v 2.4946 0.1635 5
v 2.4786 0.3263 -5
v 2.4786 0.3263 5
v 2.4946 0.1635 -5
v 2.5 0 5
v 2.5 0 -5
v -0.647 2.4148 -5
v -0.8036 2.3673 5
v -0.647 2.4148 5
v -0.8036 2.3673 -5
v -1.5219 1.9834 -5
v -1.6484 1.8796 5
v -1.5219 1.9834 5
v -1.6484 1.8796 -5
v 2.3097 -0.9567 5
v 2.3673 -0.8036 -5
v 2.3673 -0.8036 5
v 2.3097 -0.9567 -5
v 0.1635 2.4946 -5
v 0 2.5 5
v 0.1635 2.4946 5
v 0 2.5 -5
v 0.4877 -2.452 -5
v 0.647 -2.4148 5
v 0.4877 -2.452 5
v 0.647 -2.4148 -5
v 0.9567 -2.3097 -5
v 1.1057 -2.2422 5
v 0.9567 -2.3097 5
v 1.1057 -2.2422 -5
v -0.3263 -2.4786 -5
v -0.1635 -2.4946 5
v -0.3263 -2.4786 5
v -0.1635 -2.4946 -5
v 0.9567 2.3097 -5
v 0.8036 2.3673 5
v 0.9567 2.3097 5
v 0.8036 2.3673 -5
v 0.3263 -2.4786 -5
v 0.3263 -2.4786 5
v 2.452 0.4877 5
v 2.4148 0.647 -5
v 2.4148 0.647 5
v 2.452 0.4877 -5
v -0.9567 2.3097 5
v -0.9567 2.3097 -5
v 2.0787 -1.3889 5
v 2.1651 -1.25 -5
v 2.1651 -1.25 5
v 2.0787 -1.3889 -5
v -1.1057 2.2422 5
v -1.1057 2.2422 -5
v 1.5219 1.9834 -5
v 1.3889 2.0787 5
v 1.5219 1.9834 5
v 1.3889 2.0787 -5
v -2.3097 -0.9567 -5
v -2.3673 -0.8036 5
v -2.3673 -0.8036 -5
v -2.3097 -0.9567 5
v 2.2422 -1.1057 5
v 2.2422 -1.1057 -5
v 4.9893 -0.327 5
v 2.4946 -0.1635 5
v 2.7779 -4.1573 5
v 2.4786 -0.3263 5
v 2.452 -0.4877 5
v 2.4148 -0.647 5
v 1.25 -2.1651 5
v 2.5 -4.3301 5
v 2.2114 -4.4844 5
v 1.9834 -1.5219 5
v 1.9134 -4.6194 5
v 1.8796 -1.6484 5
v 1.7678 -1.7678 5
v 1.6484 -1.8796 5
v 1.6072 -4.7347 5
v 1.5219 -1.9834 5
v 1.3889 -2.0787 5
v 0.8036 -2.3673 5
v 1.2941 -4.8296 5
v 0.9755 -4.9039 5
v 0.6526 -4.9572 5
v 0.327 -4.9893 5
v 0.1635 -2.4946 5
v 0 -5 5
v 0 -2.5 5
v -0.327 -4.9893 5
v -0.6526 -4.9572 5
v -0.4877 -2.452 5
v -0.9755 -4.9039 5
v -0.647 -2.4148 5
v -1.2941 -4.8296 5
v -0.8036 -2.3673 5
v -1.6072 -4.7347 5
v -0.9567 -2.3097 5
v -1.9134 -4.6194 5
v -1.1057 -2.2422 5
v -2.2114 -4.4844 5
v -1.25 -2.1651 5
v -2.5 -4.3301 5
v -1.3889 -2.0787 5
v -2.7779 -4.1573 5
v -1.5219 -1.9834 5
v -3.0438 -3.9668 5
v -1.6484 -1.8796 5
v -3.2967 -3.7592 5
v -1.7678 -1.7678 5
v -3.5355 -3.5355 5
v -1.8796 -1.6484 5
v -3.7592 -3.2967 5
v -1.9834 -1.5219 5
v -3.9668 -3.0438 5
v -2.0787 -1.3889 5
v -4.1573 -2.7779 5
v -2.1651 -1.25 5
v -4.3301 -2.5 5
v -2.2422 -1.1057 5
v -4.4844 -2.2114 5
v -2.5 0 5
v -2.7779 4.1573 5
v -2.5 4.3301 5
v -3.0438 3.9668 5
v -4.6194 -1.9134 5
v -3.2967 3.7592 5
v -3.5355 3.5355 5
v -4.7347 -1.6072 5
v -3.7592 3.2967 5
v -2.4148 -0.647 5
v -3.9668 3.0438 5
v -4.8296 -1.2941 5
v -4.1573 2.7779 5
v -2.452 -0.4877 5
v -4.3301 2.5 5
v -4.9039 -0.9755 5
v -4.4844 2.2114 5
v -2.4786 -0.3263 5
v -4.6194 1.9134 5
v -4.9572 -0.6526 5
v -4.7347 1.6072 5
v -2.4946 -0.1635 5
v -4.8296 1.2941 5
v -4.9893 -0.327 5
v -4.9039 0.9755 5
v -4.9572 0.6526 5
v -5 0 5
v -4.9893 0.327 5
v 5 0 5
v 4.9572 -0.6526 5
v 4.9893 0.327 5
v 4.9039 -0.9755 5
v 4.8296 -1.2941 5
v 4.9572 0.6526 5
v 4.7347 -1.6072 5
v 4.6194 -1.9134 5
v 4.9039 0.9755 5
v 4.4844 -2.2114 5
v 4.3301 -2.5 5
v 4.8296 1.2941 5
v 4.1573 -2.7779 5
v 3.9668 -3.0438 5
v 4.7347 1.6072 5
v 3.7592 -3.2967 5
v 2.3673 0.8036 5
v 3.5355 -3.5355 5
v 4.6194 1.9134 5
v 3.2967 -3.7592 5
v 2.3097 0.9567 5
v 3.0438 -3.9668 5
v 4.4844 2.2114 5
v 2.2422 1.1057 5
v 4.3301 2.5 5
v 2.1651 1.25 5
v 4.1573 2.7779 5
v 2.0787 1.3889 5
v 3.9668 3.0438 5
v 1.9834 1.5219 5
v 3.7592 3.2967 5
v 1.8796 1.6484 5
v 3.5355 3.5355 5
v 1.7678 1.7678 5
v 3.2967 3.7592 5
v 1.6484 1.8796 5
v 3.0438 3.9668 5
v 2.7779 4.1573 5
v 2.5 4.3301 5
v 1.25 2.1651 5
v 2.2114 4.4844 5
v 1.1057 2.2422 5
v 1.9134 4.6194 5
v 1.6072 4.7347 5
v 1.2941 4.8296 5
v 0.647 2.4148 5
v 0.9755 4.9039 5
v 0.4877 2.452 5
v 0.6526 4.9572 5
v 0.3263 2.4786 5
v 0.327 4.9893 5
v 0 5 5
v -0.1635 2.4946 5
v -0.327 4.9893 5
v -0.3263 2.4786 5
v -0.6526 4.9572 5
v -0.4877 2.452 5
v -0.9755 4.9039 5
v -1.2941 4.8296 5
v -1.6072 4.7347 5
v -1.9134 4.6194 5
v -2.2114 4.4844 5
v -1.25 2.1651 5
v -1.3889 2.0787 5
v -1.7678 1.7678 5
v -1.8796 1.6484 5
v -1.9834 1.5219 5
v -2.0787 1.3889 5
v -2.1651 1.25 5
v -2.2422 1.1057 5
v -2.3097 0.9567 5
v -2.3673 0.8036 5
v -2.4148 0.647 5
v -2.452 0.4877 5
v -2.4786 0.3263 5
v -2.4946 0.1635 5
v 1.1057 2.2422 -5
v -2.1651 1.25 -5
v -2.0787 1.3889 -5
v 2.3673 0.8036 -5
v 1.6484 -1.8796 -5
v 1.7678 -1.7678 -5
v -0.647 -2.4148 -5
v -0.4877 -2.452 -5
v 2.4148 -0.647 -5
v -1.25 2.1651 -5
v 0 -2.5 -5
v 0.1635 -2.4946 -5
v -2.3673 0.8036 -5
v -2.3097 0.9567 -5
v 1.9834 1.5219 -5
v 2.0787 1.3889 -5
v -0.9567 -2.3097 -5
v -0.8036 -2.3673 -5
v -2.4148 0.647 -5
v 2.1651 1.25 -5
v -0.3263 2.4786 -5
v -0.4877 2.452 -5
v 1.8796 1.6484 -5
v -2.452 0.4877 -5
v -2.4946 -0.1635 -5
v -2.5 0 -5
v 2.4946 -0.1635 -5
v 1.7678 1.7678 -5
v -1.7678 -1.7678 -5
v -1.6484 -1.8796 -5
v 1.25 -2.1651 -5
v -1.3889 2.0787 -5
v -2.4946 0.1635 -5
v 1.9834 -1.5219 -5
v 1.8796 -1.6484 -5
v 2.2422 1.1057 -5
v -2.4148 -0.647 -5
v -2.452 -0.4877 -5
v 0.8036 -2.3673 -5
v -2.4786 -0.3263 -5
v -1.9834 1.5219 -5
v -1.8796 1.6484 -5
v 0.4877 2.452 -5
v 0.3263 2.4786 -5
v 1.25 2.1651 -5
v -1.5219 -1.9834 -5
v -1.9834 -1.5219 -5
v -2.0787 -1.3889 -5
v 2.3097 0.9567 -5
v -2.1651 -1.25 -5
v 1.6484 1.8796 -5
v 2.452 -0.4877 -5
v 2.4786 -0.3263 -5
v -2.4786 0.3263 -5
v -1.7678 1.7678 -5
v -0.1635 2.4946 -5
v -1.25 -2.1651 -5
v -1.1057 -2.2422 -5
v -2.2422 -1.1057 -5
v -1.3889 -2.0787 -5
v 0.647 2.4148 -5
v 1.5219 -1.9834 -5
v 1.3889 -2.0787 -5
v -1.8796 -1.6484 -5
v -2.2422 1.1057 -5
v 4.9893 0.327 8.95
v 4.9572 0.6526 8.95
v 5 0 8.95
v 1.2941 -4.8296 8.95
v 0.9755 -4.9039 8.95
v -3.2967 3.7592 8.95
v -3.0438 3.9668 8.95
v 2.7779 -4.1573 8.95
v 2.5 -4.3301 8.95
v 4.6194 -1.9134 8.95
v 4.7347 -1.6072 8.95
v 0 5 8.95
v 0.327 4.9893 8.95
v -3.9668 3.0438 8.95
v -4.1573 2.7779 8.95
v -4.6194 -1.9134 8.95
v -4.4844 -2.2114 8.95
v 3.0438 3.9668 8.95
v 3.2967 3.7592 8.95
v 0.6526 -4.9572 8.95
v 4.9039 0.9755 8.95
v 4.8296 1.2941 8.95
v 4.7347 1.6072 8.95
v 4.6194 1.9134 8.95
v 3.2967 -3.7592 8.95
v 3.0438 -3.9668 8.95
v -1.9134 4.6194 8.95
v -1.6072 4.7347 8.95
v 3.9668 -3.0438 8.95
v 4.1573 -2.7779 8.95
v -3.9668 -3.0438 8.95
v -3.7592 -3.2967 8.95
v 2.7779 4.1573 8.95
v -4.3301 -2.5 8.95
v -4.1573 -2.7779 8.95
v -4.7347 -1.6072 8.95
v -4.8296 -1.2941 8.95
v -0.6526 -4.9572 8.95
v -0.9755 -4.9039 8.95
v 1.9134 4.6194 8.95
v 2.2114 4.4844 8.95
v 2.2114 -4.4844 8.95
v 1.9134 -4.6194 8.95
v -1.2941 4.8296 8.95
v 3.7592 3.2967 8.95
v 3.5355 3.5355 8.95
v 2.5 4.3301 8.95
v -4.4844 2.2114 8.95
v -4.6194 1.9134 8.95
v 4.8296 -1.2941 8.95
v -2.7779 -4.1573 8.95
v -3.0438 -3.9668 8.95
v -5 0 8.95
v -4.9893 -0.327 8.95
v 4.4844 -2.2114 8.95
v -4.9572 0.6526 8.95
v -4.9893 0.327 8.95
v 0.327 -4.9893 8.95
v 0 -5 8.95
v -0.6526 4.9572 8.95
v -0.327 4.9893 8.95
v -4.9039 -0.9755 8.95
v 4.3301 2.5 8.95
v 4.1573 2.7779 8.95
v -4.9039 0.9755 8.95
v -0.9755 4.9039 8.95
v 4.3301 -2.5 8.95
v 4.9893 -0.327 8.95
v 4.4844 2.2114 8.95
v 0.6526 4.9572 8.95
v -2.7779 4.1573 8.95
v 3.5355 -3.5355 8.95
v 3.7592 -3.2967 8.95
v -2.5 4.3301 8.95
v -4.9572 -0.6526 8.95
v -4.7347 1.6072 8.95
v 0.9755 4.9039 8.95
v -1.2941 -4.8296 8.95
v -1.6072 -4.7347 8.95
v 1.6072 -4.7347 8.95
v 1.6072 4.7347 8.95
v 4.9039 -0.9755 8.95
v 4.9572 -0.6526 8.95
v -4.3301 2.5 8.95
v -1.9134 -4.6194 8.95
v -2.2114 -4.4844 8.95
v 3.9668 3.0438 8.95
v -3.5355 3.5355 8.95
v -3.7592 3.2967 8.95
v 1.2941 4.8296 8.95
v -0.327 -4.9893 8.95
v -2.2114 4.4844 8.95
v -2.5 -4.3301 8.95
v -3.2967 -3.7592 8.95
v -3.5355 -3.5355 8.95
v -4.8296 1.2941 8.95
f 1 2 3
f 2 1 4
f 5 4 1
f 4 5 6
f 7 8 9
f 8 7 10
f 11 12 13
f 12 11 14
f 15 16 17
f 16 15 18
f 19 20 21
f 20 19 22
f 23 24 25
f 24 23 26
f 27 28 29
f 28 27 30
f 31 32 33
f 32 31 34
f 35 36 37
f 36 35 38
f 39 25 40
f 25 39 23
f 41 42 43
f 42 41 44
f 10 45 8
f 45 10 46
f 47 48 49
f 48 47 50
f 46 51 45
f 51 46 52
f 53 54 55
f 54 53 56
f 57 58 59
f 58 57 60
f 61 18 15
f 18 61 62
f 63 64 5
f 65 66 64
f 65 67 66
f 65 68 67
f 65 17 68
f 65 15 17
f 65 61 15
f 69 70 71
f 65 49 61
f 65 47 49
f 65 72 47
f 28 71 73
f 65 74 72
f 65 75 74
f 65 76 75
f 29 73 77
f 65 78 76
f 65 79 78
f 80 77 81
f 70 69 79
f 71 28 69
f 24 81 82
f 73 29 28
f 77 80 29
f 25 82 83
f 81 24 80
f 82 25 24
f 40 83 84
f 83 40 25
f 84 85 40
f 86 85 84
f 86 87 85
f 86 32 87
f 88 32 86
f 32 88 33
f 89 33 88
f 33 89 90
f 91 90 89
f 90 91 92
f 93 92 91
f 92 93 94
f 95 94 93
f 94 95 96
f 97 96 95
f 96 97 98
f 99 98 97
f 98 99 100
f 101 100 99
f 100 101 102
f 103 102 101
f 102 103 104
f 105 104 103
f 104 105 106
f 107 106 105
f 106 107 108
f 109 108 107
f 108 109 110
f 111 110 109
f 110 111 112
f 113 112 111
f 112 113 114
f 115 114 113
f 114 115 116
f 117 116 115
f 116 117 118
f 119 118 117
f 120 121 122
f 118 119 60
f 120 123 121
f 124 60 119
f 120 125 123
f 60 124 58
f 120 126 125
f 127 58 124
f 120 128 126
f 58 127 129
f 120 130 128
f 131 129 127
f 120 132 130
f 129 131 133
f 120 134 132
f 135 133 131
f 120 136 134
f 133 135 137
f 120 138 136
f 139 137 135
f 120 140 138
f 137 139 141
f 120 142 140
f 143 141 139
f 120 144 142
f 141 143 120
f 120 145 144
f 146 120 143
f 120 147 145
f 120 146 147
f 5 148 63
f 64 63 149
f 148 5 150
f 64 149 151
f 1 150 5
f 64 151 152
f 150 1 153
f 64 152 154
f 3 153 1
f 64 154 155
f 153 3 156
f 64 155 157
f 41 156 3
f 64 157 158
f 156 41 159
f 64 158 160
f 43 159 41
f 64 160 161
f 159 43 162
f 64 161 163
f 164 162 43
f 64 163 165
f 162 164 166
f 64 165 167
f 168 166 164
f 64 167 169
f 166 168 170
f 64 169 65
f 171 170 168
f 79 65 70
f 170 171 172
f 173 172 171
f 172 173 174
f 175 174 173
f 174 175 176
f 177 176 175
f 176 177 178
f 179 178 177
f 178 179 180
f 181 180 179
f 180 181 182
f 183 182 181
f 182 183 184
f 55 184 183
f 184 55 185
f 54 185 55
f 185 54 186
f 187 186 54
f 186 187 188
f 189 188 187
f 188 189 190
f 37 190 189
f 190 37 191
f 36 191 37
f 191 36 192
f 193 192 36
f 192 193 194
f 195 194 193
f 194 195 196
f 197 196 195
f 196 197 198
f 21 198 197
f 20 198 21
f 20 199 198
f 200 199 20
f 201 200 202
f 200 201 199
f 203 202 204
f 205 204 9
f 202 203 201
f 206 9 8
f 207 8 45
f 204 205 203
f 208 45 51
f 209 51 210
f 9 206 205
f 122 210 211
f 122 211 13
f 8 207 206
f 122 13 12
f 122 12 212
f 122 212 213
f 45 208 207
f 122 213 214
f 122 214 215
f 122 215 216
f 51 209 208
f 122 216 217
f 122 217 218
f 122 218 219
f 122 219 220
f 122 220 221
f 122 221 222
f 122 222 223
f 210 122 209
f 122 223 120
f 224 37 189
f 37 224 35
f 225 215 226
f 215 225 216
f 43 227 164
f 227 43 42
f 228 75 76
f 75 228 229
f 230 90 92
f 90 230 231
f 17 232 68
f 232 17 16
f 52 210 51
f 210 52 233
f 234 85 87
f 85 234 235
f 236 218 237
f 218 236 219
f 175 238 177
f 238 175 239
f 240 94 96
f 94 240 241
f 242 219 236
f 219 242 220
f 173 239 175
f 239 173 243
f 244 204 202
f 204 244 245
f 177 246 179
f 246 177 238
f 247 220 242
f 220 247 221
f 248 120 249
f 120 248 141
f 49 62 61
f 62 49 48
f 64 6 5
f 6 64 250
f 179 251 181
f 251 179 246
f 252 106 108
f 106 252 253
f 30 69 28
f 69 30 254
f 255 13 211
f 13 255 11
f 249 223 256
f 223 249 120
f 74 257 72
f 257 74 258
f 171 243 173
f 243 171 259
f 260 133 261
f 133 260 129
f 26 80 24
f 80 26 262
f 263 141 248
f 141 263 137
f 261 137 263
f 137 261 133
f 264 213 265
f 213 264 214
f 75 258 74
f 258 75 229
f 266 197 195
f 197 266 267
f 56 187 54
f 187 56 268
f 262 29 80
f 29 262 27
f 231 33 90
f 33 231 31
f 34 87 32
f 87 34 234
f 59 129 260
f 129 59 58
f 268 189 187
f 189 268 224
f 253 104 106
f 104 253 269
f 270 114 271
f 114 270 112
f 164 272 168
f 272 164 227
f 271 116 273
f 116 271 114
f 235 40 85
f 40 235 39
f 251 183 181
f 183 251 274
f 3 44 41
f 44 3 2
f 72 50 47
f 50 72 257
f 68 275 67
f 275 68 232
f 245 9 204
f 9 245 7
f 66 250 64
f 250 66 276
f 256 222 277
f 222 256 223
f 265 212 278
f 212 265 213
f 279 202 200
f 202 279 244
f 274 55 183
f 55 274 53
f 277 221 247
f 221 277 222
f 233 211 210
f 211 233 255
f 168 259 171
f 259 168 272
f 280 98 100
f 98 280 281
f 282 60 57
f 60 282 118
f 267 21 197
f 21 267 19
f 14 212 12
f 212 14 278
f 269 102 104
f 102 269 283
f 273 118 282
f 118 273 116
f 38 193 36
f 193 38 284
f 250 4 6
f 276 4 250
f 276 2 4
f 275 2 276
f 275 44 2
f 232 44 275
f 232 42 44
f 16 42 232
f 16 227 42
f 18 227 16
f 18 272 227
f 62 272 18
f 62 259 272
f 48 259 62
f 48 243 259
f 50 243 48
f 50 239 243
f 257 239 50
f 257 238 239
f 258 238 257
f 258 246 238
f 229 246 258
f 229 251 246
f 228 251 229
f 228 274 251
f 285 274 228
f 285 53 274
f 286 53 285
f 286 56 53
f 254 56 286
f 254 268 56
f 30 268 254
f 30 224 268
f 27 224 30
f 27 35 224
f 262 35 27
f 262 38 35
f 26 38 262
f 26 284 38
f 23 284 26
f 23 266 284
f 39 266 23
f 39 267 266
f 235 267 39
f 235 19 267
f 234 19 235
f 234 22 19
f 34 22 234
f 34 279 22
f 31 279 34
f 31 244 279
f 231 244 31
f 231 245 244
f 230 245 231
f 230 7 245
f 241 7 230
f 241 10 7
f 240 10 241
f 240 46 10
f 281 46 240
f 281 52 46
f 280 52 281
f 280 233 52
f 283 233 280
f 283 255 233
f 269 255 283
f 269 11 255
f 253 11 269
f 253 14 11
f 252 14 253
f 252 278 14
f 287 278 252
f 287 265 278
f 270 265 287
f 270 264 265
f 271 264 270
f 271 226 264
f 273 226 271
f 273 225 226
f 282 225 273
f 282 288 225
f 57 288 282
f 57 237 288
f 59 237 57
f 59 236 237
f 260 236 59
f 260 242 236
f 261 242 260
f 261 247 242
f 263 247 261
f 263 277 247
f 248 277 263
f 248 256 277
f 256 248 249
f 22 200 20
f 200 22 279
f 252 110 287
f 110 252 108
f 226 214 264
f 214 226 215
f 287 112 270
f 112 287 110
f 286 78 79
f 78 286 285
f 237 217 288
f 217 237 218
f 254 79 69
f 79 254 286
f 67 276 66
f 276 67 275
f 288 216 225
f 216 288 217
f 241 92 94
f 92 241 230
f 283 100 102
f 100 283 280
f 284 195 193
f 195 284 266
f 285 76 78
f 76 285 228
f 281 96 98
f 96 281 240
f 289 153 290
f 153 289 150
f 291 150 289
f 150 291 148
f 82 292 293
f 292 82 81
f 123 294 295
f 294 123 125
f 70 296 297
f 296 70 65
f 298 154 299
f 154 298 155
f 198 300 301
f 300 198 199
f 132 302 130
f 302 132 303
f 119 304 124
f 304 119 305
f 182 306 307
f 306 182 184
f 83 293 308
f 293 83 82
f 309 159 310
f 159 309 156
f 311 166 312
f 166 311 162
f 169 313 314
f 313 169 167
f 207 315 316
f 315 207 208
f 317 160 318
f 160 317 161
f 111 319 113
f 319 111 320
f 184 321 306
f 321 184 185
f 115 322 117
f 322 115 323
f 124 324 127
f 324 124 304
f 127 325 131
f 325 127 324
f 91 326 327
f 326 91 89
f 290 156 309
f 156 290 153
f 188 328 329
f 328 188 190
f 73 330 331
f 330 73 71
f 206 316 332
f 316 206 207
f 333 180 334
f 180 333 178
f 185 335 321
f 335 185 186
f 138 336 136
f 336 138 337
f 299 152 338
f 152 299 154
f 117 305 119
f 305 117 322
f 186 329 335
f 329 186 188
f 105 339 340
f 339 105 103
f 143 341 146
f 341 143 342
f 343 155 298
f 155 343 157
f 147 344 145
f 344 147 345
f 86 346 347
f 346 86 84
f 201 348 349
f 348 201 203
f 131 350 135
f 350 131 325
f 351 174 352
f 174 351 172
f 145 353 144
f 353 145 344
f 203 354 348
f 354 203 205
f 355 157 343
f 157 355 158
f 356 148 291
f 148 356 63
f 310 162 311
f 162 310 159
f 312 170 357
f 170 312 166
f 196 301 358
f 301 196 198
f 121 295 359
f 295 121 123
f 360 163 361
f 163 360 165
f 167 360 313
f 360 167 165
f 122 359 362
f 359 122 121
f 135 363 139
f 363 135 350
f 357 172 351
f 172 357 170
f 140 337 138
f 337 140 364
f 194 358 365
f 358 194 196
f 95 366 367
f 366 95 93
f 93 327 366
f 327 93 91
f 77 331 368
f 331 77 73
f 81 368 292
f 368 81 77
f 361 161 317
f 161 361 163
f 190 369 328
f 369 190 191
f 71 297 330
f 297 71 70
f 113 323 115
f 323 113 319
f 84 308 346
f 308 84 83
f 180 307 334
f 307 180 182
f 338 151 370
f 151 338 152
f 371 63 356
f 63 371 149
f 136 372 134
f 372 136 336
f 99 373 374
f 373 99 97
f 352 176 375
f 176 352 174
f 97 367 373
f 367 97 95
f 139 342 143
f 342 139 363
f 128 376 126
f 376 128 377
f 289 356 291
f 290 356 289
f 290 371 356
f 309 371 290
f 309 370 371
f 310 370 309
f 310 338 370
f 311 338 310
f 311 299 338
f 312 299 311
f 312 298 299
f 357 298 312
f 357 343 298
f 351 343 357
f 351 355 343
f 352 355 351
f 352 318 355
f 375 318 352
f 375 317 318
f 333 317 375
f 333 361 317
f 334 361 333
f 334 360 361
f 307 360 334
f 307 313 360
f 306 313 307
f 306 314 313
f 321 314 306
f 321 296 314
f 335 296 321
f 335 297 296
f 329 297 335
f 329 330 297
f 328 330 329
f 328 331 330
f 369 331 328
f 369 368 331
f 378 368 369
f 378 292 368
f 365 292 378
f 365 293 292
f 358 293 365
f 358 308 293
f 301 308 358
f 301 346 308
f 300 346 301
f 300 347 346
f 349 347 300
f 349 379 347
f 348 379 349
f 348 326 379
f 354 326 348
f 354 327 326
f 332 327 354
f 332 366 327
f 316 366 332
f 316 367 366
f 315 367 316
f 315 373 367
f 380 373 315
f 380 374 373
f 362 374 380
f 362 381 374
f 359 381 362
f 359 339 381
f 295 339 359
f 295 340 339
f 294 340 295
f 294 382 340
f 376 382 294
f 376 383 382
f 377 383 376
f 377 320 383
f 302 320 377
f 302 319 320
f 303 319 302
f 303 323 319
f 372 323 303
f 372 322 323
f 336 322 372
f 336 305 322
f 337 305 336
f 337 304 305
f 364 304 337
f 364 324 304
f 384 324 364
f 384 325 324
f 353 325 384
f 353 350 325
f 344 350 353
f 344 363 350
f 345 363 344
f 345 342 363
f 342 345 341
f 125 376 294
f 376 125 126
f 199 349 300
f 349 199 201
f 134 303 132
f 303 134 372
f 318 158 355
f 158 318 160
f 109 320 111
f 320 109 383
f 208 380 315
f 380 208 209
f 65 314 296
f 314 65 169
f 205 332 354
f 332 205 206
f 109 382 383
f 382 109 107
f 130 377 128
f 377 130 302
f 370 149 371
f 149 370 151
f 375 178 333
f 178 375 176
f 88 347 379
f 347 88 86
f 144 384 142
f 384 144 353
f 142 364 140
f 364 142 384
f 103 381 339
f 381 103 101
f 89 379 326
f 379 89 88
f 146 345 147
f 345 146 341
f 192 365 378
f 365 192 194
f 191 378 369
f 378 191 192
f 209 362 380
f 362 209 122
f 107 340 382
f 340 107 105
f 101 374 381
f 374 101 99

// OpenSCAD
$fn=96;

module pan_head_screw(shaft_d=5.0, length=10.0, head_d=10.0, head_h=3.95) {
    union() {
        translate([0,0,-length/2])
            cylinder(h=length, d=shaft_d);

        translate([0,0,length/2])
            cylinder(h=head_h, d=head_d);
    }
}

pan_head_screw(shaft_d=5.0, length=10.0, head_d=10.0, head_h=3.95);
